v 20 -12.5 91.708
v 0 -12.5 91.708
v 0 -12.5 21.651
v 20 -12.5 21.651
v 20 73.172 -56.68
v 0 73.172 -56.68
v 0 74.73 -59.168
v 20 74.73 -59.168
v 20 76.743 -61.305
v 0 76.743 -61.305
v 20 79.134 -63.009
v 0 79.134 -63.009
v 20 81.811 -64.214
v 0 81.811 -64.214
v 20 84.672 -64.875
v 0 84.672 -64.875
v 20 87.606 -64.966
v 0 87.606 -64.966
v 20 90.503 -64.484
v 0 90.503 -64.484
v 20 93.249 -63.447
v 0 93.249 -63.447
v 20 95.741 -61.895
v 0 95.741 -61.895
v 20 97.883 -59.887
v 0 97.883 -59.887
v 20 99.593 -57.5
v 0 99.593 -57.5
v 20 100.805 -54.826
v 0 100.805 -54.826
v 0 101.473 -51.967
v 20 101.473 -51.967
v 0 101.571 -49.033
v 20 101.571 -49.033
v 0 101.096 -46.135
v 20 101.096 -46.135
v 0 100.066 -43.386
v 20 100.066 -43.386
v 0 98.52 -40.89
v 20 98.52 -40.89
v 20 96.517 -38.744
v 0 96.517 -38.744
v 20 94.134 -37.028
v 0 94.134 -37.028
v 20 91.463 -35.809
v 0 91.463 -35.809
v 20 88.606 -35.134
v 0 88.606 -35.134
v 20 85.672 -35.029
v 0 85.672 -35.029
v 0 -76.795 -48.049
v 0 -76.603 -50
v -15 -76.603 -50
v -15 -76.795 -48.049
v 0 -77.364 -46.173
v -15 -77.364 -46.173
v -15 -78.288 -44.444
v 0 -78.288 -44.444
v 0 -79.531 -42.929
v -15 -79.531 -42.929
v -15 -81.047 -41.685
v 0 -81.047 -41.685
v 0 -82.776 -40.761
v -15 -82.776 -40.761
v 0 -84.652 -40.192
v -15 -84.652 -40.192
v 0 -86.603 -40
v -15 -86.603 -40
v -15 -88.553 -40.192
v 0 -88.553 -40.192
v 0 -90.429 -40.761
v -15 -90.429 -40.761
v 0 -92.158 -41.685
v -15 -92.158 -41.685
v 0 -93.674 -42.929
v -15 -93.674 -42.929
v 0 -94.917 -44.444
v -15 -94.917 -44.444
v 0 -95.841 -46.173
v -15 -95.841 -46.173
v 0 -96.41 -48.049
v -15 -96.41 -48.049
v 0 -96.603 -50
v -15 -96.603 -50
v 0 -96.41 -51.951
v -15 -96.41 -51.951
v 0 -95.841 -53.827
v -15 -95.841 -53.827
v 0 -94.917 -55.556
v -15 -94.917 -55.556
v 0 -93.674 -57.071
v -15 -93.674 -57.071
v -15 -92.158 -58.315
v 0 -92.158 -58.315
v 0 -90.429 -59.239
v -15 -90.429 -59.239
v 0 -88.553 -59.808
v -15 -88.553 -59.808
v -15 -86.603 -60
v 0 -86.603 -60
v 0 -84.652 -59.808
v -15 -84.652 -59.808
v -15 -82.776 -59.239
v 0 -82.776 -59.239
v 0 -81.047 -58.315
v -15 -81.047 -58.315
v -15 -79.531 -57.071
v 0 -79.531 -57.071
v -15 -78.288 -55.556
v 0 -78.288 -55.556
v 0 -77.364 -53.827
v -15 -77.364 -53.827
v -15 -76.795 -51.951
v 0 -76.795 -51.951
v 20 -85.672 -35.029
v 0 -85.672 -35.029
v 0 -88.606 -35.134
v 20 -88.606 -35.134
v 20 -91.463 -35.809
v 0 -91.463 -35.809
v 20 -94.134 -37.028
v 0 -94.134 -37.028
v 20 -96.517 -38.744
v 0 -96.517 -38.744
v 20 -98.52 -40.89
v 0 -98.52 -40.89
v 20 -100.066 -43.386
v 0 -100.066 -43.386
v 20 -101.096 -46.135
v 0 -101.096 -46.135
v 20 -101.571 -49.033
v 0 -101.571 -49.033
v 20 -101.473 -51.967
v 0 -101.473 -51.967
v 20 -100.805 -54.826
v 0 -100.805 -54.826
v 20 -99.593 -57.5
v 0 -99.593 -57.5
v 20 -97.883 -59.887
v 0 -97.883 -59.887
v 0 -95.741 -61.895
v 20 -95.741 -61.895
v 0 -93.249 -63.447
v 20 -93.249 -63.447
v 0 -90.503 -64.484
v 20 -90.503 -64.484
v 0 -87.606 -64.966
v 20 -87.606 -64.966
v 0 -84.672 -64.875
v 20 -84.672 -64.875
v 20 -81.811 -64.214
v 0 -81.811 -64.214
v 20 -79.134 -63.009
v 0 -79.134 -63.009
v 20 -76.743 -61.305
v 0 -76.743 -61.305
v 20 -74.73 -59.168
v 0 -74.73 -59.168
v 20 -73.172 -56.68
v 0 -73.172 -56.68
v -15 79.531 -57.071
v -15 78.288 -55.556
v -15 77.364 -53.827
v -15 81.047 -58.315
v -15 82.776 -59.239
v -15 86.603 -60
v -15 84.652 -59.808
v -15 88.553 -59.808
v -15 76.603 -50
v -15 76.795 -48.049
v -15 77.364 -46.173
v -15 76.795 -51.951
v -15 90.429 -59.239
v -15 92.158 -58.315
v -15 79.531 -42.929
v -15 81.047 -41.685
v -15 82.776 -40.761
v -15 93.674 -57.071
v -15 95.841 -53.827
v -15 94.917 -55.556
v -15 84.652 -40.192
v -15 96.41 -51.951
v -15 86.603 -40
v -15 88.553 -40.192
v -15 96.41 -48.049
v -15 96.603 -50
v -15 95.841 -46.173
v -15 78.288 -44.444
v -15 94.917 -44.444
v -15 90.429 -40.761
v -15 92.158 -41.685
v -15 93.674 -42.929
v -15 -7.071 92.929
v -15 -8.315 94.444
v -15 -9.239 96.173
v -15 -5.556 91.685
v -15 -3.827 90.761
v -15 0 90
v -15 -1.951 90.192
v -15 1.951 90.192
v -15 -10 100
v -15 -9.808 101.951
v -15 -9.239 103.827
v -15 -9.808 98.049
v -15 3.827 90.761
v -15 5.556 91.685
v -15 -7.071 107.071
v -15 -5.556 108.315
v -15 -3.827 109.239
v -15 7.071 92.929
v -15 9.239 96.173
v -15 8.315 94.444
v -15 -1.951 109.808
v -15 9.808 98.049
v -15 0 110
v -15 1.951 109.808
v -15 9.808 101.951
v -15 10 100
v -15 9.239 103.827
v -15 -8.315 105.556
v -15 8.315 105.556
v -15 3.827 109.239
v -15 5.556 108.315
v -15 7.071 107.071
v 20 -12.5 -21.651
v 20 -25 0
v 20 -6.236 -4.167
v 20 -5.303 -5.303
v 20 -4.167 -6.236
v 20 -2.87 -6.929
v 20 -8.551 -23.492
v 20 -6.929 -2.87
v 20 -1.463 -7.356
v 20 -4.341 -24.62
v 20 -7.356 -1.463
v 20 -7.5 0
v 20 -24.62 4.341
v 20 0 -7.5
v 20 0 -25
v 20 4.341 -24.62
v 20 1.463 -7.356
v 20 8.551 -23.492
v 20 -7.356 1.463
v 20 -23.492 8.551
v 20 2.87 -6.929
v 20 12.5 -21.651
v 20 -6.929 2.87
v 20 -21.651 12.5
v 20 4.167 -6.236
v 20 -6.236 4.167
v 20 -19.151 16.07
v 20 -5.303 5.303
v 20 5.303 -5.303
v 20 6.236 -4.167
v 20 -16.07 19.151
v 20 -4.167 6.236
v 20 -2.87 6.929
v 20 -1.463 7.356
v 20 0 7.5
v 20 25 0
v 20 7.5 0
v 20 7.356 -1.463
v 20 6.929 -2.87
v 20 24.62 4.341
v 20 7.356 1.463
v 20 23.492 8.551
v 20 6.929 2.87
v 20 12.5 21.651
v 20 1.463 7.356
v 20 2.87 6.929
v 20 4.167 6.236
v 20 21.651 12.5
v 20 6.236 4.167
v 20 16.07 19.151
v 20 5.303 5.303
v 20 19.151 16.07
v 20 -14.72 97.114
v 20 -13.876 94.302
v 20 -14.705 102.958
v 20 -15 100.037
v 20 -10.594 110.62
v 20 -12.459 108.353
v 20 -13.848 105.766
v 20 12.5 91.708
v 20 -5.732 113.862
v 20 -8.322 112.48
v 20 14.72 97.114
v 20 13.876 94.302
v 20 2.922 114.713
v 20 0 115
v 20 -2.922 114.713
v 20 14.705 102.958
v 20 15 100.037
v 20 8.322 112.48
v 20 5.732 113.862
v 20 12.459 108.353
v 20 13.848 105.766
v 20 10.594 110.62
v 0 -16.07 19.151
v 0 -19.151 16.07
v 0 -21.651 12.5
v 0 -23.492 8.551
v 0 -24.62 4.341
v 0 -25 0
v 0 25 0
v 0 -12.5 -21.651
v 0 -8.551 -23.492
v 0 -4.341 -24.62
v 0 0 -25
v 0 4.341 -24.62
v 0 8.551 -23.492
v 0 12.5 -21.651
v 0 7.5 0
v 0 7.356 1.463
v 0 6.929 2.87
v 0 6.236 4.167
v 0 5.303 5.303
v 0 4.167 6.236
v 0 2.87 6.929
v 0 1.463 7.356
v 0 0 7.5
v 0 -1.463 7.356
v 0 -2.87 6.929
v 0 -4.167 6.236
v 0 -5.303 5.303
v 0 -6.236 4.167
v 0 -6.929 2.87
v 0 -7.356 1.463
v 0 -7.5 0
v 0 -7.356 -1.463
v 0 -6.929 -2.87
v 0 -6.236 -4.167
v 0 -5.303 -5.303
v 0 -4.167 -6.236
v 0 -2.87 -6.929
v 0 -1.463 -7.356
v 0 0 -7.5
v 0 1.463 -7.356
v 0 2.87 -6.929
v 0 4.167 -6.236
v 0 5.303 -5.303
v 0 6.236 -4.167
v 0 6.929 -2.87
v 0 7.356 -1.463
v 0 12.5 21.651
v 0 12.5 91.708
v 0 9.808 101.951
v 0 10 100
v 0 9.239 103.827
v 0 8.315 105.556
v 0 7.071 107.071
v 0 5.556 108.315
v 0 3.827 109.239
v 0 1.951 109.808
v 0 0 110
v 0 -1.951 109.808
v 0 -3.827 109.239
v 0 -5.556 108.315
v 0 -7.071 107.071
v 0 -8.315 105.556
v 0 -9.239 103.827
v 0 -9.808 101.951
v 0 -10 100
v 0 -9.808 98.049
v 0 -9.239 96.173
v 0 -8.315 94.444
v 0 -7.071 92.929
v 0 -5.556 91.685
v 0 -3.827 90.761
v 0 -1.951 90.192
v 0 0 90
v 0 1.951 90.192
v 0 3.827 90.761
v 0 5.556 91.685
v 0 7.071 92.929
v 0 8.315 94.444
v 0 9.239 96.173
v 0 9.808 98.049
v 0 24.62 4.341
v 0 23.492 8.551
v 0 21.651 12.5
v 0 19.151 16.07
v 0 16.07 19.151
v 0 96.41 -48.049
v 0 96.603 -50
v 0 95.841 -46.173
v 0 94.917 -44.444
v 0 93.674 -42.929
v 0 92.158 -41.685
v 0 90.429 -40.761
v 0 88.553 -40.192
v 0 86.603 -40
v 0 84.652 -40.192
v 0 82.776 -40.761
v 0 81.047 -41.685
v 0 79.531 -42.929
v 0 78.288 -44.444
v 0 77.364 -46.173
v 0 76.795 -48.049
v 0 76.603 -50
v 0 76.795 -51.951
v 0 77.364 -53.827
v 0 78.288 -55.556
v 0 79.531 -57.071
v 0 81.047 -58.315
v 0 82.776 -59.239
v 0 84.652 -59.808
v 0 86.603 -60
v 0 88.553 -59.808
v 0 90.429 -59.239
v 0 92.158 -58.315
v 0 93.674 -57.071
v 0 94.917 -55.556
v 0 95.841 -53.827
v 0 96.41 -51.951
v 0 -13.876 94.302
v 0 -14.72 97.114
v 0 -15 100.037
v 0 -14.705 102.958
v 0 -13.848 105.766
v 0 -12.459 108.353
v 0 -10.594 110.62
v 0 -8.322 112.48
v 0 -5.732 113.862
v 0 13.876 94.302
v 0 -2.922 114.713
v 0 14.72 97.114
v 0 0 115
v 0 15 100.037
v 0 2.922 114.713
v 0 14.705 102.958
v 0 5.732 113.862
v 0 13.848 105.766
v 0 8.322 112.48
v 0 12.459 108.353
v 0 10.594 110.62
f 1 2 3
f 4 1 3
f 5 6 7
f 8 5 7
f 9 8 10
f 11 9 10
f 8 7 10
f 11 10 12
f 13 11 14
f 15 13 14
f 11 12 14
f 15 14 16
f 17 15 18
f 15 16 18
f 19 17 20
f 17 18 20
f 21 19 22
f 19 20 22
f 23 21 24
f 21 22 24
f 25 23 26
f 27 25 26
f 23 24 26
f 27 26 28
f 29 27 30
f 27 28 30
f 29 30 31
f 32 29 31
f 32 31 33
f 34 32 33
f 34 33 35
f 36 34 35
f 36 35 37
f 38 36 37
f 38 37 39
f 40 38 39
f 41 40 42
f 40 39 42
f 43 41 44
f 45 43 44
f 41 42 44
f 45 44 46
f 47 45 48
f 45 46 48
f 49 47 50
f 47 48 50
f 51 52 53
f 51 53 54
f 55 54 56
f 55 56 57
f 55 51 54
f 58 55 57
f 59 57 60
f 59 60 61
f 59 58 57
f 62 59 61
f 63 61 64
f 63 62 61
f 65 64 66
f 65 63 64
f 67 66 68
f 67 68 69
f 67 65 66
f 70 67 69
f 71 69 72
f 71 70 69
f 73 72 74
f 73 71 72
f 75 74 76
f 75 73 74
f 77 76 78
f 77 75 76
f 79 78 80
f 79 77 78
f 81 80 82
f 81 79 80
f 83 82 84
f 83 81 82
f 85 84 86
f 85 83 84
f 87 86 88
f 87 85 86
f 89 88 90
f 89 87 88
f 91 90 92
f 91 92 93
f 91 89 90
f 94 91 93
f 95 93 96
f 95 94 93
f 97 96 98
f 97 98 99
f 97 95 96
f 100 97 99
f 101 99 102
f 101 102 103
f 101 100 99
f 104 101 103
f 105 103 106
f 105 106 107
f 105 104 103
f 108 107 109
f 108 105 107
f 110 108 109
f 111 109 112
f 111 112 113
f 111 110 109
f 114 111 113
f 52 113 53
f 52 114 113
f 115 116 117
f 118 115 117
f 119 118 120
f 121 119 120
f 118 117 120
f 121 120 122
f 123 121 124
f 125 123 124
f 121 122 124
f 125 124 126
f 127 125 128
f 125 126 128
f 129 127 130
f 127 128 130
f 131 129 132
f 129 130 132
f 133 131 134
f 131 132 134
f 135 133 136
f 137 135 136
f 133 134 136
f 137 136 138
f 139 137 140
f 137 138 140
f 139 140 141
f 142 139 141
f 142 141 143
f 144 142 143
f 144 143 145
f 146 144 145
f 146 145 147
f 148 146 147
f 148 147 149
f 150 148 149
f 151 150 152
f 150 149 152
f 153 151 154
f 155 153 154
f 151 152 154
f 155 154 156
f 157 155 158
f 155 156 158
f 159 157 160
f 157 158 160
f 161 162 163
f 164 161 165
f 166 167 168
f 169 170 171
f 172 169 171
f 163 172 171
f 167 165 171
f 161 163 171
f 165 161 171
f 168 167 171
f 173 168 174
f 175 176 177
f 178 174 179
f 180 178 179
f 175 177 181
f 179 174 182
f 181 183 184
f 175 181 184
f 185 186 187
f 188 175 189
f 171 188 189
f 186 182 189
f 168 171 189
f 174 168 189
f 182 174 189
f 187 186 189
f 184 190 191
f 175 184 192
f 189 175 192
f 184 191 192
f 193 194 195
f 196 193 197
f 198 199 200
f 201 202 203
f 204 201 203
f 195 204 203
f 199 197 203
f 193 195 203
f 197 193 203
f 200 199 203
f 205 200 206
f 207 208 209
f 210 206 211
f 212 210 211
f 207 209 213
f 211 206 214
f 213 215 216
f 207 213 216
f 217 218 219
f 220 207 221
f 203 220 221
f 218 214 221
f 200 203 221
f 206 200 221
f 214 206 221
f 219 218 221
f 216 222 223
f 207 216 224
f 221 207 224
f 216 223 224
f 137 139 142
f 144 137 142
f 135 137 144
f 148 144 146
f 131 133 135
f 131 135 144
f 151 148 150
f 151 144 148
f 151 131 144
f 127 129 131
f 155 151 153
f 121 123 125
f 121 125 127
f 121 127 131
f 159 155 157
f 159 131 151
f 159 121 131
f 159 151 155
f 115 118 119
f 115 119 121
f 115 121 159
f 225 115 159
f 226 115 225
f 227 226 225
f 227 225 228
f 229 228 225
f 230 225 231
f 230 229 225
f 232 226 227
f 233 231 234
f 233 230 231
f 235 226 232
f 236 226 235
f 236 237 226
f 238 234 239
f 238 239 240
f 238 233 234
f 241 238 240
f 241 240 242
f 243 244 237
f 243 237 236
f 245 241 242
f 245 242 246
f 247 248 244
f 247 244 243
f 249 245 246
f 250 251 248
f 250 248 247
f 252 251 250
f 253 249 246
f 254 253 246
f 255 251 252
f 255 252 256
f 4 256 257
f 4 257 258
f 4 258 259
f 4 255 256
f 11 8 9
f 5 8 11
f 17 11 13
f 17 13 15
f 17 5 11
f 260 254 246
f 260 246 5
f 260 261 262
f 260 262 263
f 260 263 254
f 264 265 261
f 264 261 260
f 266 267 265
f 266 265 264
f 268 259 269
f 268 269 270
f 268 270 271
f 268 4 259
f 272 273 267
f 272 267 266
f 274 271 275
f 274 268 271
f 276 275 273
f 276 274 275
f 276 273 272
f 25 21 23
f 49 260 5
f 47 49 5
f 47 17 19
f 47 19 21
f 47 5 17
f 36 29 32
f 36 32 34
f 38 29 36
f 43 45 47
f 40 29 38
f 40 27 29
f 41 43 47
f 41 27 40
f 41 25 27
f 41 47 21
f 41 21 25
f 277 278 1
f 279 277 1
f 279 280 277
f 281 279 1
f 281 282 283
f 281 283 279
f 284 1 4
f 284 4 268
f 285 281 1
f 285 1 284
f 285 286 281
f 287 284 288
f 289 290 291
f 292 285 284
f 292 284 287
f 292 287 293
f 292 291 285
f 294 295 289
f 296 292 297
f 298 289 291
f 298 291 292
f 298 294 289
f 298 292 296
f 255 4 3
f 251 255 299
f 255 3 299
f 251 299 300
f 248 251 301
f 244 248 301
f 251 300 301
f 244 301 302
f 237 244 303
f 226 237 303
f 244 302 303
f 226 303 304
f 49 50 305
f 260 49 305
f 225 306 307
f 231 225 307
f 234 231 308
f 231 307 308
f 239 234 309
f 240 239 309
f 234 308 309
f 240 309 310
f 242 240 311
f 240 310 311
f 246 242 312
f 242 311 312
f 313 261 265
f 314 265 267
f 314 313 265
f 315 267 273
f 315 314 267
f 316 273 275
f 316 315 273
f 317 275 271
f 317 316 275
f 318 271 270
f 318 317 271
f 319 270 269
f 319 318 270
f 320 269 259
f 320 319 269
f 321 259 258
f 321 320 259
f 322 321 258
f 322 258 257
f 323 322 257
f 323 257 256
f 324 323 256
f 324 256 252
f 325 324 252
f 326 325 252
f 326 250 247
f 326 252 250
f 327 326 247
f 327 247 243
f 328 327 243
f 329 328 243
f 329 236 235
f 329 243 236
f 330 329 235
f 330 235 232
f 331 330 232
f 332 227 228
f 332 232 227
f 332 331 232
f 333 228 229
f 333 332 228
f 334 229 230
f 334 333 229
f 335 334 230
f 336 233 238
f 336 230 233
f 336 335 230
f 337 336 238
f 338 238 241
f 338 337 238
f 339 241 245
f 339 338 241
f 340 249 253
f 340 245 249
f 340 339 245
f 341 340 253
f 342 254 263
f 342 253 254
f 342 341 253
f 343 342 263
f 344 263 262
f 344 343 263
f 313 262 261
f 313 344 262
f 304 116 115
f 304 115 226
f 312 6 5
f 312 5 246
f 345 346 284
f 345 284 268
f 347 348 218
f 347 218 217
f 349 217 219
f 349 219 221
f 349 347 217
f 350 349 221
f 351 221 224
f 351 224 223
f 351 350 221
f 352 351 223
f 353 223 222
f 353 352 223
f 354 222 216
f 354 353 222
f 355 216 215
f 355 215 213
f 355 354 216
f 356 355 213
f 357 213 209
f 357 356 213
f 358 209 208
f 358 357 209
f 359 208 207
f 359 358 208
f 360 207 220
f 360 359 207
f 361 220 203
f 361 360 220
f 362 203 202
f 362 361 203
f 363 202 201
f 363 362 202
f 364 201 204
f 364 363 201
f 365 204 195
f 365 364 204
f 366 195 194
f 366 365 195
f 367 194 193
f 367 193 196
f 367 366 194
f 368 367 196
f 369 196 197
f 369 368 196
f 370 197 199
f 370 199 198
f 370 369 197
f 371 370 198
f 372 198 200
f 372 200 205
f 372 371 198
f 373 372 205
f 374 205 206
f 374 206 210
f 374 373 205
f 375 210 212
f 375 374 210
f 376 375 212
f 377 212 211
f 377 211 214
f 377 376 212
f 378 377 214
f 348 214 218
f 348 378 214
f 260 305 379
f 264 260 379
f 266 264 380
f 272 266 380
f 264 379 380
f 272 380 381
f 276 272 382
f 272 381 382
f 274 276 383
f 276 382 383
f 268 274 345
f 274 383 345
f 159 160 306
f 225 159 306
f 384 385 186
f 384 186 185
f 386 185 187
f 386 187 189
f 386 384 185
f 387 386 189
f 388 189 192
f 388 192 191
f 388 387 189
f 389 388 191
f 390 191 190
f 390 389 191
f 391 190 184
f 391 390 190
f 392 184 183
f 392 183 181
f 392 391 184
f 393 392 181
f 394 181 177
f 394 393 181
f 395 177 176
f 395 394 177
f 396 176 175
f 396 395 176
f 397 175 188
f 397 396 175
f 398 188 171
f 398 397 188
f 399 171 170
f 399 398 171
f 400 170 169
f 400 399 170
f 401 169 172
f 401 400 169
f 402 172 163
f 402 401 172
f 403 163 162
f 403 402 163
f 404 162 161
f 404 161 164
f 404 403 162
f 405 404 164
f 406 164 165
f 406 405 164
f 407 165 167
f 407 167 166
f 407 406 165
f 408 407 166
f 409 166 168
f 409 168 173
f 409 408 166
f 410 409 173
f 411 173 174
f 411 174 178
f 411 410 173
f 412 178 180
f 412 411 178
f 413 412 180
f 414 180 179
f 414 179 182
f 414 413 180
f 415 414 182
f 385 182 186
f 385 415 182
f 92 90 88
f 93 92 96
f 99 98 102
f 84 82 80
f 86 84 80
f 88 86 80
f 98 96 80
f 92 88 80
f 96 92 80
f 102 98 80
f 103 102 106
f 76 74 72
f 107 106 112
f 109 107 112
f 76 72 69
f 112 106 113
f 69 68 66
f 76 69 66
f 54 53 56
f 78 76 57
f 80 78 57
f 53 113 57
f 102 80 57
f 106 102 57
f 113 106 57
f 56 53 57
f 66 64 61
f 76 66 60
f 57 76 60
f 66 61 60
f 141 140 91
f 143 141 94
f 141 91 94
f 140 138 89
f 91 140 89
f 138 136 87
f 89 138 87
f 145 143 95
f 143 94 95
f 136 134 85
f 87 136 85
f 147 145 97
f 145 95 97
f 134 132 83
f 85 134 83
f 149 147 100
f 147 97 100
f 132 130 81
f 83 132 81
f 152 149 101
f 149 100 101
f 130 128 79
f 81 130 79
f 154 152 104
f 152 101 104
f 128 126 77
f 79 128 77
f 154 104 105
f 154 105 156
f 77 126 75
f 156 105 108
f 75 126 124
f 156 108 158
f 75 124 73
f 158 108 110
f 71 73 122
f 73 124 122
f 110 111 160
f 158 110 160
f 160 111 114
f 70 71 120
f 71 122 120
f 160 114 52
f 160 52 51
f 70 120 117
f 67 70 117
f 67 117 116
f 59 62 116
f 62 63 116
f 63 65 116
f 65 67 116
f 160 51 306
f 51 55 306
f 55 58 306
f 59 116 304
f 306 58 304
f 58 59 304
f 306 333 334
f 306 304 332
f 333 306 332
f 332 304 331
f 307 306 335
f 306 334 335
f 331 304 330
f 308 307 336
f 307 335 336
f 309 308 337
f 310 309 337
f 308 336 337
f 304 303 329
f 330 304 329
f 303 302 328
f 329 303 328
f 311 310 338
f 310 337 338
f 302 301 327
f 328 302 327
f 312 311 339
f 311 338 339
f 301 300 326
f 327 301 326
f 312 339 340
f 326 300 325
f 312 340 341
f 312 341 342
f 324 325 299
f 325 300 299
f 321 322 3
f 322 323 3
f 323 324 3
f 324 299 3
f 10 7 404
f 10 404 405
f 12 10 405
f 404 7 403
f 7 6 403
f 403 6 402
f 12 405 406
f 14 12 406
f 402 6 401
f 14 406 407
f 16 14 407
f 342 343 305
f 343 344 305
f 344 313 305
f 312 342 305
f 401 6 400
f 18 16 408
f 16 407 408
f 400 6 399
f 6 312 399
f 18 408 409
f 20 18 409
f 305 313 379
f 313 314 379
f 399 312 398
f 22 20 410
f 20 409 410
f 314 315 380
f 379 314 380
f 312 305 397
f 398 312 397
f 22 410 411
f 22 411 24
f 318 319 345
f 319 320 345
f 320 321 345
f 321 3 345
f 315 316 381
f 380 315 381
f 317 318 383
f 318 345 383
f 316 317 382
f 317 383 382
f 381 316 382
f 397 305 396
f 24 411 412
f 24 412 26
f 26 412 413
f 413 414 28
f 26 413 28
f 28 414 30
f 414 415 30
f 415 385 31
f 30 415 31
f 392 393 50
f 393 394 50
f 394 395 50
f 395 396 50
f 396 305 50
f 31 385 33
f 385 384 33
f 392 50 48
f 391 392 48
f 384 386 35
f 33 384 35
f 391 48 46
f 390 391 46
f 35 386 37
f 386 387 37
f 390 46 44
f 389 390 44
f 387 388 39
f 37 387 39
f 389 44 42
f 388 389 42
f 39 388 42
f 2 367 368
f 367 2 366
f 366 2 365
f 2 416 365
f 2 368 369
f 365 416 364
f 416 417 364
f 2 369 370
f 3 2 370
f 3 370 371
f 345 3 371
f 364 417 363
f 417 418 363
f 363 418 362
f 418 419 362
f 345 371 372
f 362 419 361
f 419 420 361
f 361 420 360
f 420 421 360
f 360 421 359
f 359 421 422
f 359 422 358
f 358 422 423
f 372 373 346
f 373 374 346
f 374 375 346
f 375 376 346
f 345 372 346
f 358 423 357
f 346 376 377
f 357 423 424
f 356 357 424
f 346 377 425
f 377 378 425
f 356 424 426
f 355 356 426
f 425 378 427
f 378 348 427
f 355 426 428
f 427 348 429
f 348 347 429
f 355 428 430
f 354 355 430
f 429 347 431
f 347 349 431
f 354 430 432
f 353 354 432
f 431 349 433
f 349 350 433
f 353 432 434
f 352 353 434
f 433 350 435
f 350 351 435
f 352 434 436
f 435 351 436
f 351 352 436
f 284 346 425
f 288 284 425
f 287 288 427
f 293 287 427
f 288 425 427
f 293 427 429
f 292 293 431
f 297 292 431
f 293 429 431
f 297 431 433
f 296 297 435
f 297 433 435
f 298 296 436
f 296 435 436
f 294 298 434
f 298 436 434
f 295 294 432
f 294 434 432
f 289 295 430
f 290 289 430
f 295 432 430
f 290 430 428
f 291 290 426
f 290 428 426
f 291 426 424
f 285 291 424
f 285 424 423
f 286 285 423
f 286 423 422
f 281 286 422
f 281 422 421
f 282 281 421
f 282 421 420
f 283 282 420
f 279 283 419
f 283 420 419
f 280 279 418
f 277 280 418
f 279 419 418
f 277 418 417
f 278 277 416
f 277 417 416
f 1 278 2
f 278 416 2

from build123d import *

# Parameters (mm, degrees)
SKETCH_0_R         = 7.5
PAD_DEPTH          = 20
POLARPATTERN_COUNT = 3
SKETCH_R           = 10
PAD001_DEPTH       = 15


with BuildPart() as part:
    # Sketch_0 (on LCS_) → Pad (new body)
    with BuildSketch(Plane.YZ):
        with BuildLine():
            ThreePointArc((-12.5, 21.650635), (0, -25), (12.5, 21.650635))
            Line((12.5, 91.708438), (12.5, 21.650635))
            ThreePointArc((12.5, 91.708438), (0, 115), (-12.5, 91.708438))
            Line((-12.5, 91.708438), (-12.5, 21.650635))
        make_face()
        Circle(SKETCH_0_R, mode=Mode.SUBTRACT)
    pad = extrude(amount=PAD_DEPTH)

    # PolarPattern: Pad ×3 about axis
    polarpattern_axis = Axis((0, 0, 0), (1, 0, 0))
    for i in range(1, POLARPATTERN_COUNT):
        add(pad.rotate(polarpattern_axis, i * 360 / POLARPATTERN_COUNT))

    # Sketch (on LCS_) → Pad001 (join)
    with BuildSketch(Plane.YZ):
        with Locations((0, 100)):
            Circle(SKETCH_R)
        with Locations((86.60254, -50)):
            Circle(SKETCH_R)
        with Locations((-86.60254, -50)):
            Circle(SKETCH_R)
    extrude(amount=-PAD001_DEPTH)


solid = part.part
